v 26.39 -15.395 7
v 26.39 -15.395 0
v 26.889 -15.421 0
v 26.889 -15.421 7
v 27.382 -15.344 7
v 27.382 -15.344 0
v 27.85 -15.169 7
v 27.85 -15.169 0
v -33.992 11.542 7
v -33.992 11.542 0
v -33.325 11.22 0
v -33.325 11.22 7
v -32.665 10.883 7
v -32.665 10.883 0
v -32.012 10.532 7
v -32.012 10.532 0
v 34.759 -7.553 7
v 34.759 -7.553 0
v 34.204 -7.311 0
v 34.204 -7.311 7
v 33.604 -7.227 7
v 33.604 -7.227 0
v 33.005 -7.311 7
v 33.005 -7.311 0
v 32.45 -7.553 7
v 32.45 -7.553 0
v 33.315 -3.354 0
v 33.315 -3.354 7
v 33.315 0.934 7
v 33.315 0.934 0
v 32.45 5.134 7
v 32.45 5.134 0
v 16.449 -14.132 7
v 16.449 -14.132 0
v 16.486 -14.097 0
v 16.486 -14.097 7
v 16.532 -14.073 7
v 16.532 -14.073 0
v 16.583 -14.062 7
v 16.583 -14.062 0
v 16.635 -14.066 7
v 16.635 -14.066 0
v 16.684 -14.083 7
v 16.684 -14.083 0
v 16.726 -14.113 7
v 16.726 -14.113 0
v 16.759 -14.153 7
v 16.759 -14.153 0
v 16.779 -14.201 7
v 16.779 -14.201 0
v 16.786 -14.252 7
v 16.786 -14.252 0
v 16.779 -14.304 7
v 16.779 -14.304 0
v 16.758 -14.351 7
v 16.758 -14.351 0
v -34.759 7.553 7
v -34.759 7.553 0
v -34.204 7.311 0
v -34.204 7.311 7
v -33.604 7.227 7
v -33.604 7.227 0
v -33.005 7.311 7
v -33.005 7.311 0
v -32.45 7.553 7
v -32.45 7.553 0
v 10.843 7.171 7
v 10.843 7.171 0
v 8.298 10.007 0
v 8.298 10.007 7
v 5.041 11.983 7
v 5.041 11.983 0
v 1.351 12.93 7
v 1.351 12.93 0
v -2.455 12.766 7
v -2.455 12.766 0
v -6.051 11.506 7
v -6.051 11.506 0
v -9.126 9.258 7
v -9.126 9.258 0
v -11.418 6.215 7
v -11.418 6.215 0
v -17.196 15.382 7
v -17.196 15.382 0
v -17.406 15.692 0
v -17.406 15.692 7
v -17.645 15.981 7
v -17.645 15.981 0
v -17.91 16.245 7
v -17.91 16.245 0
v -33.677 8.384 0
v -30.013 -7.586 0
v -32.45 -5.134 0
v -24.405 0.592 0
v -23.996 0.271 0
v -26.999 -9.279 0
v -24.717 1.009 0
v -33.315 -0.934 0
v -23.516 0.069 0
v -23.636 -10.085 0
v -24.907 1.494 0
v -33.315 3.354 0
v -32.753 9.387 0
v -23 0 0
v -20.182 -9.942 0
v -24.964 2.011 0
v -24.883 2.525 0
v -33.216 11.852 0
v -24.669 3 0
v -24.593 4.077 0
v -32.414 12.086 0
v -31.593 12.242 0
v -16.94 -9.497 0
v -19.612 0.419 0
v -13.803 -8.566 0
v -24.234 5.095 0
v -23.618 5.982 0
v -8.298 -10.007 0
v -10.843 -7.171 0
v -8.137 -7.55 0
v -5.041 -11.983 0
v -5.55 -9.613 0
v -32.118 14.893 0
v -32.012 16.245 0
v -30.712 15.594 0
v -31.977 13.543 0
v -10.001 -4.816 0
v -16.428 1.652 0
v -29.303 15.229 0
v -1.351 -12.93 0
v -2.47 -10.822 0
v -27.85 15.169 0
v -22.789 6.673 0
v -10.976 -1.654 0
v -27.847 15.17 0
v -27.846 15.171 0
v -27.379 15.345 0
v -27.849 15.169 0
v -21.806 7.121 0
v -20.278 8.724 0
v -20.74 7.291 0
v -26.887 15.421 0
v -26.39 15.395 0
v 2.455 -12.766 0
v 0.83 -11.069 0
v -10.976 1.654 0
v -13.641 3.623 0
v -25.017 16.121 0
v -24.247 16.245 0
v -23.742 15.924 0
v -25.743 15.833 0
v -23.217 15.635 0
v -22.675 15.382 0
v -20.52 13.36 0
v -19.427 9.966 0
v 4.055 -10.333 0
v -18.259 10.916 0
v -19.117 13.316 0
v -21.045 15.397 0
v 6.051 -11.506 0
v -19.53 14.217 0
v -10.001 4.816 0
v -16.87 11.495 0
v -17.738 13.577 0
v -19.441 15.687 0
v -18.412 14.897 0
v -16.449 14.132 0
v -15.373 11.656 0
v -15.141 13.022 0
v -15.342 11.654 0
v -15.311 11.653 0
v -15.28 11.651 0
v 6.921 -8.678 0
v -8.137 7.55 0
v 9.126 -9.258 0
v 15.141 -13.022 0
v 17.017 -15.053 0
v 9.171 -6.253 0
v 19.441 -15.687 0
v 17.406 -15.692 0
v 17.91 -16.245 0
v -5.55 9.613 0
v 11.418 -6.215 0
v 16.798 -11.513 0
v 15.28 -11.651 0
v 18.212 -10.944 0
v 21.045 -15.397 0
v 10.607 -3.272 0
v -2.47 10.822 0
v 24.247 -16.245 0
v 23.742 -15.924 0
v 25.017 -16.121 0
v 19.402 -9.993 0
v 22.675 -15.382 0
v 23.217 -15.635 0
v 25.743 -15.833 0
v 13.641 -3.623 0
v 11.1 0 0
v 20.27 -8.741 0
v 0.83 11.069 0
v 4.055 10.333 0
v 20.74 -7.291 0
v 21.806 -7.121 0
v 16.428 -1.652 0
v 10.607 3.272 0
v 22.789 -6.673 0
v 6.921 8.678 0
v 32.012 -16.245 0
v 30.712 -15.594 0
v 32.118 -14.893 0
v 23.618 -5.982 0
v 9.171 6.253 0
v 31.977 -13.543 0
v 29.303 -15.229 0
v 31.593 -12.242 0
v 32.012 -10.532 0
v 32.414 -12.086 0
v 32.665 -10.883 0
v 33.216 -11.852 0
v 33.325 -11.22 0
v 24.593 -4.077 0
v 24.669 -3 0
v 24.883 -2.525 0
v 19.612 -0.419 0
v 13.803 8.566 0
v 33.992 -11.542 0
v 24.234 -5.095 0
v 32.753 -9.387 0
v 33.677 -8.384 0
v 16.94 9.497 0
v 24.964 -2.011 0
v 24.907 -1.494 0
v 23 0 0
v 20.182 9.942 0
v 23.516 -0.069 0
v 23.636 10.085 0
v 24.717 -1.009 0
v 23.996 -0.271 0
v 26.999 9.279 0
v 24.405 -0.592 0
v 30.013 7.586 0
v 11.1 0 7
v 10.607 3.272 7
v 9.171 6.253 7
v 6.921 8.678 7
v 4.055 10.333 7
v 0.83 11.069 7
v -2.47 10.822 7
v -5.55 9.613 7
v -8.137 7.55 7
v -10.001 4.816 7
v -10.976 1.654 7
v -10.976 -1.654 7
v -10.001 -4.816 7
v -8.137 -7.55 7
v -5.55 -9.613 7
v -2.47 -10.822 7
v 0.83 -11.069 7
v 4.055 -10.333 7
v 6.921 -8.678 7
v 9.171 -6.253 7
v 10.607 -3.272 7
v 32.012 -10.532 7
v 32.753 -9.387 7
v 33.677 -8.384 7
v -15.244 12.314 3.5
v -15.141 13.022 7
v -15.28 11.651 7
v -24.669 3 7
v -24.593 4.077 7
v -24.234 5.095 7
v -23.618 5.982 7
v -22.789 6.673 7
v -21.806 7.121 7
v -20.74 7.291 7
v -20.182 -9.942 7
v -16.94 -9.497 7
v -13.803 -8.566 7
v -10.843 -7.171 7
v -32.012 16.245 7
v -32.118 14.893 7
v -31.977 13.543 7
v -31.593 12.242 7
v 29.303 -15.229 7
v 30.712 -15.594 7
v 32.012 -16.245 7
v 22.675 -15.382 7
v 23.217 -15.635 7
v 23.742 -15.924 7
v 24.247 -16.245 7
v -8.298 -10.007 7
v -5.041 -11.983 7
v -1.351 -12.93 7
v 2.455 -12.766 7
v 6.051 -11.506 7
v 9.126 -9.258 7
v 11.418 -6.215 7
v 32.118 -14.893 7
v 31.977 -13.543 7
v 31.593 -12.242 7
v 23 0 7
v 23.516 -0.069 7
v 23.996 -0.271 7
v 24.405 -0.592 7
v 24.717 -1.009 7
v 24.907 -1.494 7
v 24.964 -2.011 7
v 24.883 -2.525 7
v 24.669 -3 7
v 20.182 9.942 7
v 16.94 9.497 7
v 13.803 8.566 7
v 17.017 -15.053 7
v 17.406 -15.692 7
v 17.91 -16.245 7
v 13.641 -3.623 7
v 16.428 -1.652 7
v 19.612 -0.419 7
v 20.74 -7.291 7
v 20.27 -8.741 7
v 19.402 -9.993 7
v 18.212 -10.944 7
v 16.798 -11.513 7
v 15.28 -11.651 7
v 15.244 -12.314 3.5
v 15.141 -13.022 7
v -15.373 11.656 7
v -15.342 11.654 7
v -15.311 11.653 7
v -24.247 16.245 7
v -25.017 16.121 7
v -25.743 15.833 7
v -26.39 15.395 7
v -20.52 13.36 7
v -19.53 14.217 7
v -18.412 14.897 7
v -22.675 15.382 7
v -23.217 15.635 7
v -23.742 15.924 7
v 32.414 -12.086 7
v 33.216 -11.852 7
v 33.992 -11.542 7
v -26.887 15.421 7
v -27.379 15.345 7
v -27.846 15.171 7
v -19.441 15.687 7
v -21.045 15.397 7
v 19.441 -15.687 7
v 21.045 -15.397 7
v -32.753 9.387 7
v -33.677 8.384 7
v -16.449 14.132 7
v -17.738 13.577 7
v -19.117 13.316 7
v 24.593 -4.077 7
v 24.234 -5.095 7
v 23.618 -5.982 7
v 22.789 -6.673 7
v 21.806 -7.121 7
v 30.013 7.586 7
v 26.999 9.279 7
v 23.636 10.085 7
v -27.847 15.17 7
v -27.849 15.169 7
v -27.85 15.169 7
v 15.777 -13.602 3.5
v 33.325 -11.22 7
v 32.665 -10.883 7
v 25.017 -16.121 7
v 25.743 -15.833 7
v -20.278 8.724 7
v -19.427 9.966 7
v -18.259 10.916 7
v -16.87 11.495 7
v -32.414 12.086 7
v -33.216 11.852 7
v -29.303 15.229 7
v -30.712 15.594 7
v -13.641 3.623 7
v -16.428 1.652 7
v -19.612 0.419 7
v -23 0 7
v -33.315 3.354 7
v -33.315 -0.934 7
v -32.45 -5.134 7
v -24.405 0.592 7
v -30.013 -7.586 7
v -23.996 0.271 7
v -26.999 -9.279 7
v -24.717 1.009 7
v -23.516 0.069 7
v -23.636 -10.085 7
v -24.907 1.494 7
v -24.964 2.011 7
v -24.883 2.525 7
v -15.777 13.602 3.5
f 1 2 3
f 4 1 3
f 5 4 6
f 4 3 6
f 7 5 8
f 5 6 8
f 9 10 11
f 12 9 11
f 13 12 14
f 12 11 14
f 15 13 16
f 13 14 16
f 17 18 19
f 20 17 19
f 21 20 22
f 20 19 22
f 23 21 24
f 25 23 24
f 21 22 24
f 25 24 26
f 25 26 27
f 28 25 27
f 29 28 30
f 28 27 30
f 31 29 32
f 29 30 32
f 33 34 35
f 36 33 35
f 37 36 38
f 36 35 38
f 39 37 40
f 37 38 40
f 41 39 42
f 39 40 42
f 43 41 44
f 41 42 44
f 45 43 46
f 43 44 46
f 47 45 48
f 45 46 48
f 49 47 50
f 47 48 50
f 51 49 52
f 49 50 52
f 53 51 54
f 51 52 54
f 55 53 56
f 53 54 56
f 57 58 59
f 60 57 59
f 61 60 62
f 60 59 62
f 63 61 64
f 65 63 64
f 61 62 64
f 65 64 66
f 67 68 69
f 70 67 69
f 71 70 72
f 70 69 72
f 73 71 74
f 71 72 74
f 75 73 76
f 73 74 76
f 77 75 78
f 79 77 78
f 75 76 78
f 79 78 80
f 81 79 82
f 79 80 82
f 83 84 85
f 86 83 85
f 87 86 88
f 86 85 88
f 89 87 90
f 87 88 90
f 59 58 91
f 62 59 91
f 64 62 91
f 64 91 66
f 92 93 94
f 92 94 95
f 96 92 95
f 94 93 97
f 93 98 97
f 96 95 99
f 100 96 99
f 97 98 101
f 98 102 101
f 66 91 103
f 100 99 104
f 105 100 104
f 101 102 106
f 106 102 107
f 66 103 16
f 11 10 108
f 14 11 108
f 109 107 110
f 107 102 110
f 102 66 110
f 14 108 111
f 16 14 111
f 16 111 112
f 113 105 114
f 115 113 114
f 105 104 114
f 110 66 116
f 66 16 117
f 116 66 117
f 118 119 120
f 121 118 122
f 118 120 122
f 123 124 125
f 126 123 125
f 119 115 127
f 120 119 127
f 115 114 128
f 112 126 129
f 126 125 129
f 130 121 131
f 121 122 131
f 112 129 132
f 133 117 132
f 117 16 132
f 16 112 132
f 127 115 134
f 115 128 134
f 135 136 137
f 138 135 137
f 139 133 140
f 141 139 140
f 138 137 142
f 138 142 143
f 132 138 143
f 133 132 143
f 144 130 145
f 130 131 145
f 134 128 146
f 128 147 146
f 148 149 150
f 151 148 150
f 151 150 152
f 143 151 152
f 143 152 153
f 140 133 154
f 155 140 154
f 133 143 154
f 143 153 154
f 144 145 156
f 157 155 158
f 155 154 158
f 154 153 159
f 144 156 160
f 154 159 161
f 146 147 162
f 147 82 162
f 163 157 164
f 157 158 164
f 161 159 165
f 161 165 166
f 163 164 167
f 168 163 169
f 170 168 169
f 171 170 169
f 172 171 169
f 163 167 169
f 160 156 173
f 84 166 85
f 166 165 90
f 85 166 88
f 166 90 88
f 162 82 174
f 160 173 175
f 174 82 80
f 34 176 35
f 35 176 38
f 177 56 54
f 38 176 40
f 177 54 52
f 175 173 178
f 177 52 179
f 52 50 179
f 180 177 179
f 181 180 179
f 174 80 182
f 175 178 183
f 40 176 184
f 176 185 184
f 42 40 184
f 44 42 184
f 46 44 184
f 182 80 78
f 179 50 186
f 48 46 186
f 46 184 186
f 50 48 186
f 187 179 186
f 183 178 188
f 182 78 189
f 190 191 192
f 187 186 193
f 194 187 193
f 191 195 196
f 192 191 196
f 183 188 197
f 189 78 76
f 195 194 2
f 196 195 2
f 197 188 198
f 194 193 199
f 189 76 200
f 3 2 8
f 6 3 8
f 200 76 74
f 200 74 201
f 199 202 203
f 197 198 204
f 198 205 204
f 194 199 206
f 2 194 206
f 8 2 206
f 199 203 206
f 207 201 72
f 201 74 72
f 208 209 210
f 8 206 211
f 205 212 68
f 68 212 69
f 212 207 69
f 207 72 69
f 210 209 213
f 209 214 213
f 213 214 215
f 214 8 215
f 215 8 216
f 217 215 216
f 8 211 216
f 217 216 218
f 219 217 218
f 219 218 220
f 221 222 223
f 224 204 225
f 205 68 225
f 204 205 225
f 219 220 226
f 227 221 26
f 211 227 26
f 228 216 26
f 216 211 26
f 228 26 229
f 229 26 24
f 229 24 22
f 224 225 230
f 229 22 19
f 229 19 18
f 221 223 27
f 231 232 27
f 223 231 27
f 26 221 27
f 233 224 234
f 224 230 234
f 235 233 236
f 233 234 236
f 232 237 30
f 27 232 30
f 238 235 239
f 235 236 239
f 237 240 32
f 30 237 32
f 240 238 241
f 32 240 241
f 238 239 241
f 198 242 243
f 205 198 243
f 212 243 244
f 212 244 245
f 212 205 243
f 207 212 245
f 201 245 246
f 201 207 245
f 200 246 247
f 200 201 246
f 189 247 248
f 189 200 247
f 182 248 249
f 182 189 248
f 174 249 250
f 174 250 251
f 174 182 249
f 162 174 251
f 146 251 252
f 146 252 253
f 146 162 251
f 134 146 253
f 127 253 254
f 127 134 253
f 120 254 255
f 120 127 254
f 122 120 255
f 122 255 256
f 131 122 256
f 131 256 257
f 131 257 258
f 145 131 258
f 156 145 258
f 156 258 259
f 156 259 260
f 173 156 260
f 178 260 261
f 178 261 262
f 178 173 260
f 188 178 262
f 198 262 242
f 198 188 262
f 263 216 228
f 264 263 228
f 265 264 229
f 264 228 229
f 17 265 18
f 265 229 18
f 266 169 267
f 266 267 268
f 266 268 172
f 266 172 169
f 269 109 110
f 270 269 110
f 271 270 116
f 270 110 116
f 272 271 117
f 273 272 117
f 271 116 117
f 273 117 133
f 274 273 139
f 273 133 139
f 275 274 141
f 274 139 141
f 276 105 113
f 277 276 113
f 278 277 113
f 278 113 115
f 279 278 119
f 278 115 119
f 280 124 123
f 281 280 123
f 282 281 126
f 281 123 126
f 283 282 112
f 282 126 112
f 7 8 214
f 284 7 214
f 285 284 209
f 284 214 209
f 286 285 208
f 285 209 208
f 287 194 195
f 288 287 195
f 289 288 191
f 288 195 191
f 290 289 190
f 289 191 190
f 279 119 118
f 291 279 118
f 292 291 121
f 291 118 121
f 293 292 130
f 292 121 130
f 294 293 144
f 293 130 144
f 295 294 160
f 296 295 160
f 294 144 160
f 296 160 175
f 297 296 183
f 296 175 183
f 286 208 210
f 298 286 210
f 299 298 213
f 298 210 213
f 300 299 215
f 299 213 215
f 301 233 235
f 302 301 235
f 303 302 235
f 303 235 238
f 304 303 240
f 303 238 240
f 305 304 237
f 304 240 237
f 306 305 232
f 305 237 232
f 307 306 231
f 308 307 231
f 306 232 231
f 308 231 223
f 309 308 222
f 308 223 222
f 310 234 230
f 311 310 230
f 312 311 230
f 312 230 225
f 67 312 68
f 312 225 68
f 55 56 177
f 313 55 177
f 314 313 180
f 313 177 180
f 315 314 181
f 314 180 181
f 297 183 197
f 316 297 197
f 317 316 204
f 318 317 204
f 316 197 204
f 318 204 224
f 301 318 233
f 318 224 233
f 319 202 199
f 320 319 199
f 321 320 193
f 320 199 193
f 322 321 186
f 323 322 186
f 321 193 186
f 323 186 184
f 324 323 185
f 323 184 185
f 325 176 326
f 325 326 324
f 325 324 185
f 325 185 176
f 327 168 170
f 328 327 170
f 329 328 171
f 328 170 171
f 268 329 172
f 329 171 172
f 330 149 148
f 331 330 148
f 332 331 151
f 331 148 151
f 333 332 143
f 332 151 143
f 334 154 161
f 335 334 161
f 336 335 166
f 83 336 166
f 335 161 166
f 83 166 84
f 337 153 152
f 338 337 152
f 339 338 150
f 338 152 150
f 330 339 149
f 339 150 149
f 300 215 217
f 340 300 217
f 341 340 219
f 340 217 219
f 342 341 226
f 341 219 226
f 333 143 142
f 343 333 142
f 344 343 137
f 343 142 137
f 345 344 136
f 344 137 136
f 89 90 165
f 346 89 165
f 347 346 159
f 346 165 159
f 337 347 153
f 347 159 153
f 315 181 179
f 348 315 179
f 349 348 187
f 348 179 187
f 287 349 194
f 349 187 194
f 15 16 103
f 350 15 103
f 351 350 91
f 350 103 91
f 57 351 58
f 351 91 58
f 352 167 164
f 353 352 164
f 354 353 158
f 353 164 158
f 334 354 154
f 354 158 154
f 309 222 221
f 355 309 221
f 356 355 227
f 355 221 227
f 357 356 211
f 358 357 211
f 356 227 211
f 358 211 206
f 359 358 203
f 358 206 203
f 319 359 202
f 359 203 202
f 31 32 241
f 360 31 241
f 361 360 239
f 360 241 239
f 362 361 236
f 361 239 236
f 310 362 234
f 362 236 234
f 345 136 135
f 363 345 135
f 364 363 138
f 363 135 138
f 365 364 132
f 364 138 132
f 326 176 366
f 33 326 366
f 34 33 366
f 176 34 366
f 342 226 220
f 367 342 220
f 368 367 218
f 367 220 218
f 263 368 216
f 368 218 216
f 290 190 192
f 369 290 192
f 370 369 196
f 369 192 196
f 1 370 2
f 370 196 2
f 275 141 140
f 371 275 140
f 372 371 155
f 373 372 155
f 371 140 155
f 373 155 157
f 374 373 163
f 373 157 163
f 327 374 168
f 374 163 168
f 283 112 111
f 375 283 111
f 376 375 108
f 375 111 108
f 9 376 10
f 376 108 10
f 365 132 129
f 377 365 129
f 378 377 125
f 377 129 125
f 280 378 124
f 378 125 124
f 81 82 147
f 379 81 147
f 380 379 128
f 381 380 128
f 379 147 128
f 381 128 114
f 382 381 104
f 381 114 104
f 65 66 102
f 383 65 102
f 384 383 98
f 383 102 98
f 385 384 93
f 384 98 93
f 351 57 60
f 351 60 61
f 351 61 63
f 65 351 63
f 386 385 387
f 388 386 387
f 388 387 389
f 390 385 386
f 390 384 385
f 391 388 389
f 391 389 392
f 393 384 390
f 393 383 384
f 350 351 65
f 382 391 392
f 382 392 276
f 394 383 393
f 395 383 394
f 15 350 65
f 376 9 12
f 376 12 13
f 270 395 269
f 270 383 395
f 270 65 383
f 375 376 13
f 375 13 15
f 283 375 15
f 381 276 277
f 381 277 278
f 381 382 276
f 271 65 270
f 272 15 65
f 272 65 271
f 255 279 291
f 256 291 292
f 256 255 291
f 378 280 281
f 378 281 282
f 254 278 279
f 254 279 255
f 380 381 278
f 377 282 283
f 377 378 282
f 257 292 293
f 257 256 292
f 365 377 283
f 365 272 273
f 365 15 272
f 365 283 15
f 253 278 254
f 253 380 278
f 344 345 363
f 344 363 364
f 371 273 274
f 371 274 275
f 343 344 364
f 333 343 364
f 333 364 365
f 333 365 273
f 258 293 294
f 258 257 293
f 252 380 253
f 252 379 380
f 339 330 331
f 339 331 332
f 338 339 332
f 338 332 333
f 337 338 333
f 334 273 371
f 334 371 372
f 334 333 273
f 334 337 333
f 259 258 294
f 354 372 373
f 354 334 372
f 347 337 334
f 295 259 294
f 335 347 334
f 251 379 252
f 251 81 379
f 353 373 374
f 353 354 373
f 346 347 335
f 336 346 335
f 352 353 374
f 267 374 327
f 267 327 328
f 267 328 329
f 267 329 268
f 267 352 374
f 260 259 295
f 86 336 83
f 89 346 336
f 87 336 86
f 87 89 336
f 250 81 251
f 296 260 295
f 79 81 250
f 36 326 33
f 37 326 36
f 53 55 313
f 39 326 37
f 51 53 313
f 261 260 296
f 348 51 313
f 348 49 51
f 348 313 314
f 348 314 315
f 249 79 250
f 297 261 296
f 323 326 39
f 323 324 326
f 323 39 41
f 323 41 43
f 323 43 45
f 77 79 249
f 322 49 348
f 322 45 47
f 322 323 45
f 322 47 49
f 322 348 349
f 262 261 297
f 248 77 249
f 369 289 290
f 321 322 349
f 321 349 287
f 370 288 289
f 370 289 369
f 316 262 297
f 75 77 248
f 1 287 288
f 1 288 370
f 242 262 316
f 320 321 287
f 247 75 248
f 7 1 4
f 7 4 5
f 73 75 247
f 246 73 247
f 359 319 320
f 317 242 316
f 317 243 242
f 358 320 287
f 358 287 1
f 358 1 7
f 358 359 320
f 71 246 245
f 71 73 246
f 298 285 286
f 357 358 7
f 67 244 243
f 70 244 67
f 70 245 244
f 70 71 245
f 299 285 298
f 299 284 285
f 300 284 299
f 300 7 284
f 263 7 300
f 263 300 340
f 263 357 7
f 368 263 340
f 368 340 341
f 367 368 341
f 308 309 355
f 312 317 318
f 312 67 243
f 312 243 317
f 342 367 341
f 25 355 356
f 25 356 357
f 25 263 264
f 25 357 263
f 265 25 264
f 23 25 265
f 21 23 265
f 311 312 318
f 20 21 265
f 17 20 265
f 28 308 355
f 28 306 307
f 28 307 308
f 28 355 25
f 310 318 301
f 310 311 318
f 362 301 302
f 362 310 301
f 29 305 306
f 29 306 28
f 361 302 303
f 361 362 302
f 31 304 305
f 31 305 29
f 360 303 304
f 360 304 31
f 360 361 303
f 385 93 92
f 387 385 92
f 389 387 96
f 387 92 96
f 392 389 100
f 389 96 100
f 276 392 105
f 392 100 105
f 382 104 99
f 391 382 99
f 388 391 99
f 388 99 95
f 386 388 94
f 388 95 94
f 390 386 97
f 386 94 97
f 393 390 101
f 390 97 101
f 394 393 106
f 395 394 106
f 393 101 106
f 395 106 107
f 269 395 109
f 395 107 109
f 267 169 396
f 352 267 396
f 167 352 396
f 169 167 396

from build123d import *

# Parameters (mm, degrees)
F0_R     = 11.1
F1_DEPTH = 7


with BuildPart() as f1:
    # F0 (on Top) → F1 (new body)
    with BuildSketch(Plane.XY):
        with BuildLine():
            ThreePointArc((-20.1820022707, -9.9415058496), (-15.3539348415, -9.091091221), (-10.8430645172, -7.1713284596))
            ThreePointArc((-10.8430645172, -7.1713284596), (0.5582056386, -12.9880101041), (11.4183705824, -6.2145646061))
            ThreePointArc((11.4183705824, -6.2145646061), (16.4281860721, -1.651791194), (23, 0))
            ThreePointArc((23, 0), (24.7165507362, -1.0092828133), (24.6691871434, -3))
            ThreePointArc((24.6691871434, -3), (23.6178456633, -5.9816728989), (20.7402704139, -7.2913495265))
            ThreePointArc((20.7402704139, -7.2913495265), (18.8416140451, -10.5123262229), (15.2804029597, -11.6513444364))
            add(Edge.make_bspline(
                [(15.1405816519, -13.0223987218), (15.2788713972, -12.2898082007), (15.2804029597, -11.6513444364)],
                knots=[5.0540557872, 5.0540557872, 5.0540557872, 5.4022551178, 5.4022551178, 5.4022551178], degree=2, weights=[1, 0.9848828954, 1]))
            add(Edge.make_bspline(
                [(15.1405816519, -13.0223987218), (15.7602589992, -13.627545907), (16.4485412205, -14.1319848698)],
                knots=[2.4227067274, 2.4227067274, 2.4227067274, 2.5604830279, 2.5604830279, 2.5604830279], degree=2, weights=[1, 0.9976281496, 1]))
            ThreePointArc((16.4485412205, -14.1319848698), (16.7059454387, -14.0965620619), (16.7578368283, -14.3511578014))
            ThreePointArc((16.7578368283, -14.3511578014), (17.1960707743, -15.3819952285), (17.9098490626, -16.2452422082))
            ThreePointArc((17.9098490626, -16.2452422082), (20.2370224114, -15.5077337484), (22.6750224829, -15.3819952285))
            ThreePointArc((22.6750224829, -15.3819952285), (23.4818826617, -15.7752677938), (24.2466118351, -16.2452422082))
            ThreePointArc((24.2466118351, -16.2452422082), (25.3881728474, -15.9967588485), (26.3896299553, -15.3951034771))
            ThreePointArc((26.3896299553, -15.3951034771), (27.1373975838, -15.3951361034), (27.8500681048, -15.1687356707))
            ThreePointArc((27.8500681048, -15.1687356707), (30.0171813338, -15.3741600066), (32.0121236145, -16.2452422082))
            ThreePointArc((32.0121236145, -16.2452422082), (32.0780721748, -14.2146599803), (31.5934991398, -12.2416413867))
            ThreePointArc((31.5934991398, -12.2416413867), (32.8180555594, -11.9786425212), (33.9920036495, -11.5421190858))
            ThreePointArc((33.9920036495, -11.5421190858), (32.9938729979, -11.0530795037), (32.0121236145, -10.5319339782))
            ThreePointArc((32.0121236145, -10.5319339782), (33.1937729386, -8.8658671292), (34.7588080404, -7.5533356057))
            ThreePointArc((34.7588080404, -7.5533356057), (33.6044737815, -7.2274734783), (32.4501395226, -7.5533356057))
            ThreePointArc((32.4501395226, -7.5533356057), (33.4243691341, -1.2097485956), (32.4501395226, 5.1338384145))
            ThreePointArc((32.4501395226, 5.1338384145), (26.9985929856, 9.2793222728), (20.1820022707, 9.9415058496))
            ThreePointArc((20.1820022707, 9.9415058496), (15.3539348415, 9.091091221), (10.8430645172, 7.1713284596))
            ThreePointArc((10.8430645172, 7.1713284596), (-0.5582056386, 12.9880101041), (-11.4183705824, 6.2145646061))
            ThreePointArc((-11.4183705824, 6.2145646061), (-16.4281860721, 1.651791194), (-23, 0))
            ThreePointArc((-23, 0), (-24.7165507362, 1.0092828133), (-24.6691871434, 3))
            ThreePointArc((-24.6691871434, 3), (-23.6178456633, 5.9816728989), (-20.7402704139, 7.2913495265))
            ThreePointArc((-20.7402704139, 7.2913495265), (-18.8775642358, 10.4833581386), (-15.3726424061, 11.6555851871))
            add(Edge.make_bspline(
                [(-15.2804029597, 11.6513444364), (-15.325524504, 11.6549876637), (-15.3726424061, 11.6555851871)],
                knots=[0.2580425601, 0.2580425601, 0.2580425601, 0.2952358655, 0.2952358655, 0.2952358655], degree=2, weights=[1, 0.9998270872, 1]))
            add(Edge.make_bspline(
                [(-15.1405816519, 13.0223987218), (-15.2788713972, 12.2898082007), (-15.2804029597, 11.6513444364)],
                knots=[5.0540557872, 5.0540557872, 5.0540557872, 5.4022551178, 5.4022551178, 5.4022551178], degree=2, weights=[1, 0.9848828954, 1]))
            add(Edge.make_bspline(
                [(-15.1405816519, 13.0223987218), (-15.7602589992, 13.627545907), (-16.4485412205, 14.1319848698)],
                knots=[2.4227067274, 2.4227067274, 2.4227067274, 2.5604830279, 2.5604830279, 2.5604830279], degree=2, weights=[1, 0.9976281496, 1]))
            ThreePointArc((-16.4485412205, 14.1319848698), (-18.4202217975, 13.4084166875), (-20.5199281941, 13.3603723279))
            ThreePointArc((-20.5199281941, 13.3603723279), (-18.985312905, 14.5805065249), (-17.1960707743, 15.3819952285))
            ThreePointArc((-17.1960707743, 15.3819952285), (-17.5217288035, 15.8394422571), (-17.9098490626, 16.2452422082))
            ThreePointArc((-17.9098490626, 16.2452422082), (-20.2370224114, 15.5077337484), (-22.6750224829, 15.3819952285))
            ThreePointArc((-22.6750224829, 15.3819952285), (-23.4818826617, 15.7752677938), (-24.2466118351, 16.2452422082))
            ThreePointArc((-24.2466118351, 16.2452422082), (-25.3881728474, 15.9967588485), (-26.3896299553, 15.3951034771))
            ThreePointArc((-26.3896299553, 15.3951034771), (-27.1352445397, 15.395468841), (-27.8461648315, 15.1706720867))
            ThreePointArc((-27.8461648315, 15.1706720867), (-27.8481169003, 15.1697047499), (-27.8500681048, 15.1687356707))
            ThreePointArc((-27.8500681048, 15.1687356707), (-30.0171813338, 15.3741600066), (-32.0121236145, 16.2452422082))
            ThreePointArc((-32.0121236145, 16.2452422082), (-32.0780721748, 14.2146599803), (-31.5934991398, 12.2416413867))
            ThreePointArc((-31.5934991398, 12.2416413867), (-32.8180555594, 11.9786425212), (-33.9920036495, 11.5421190858))
            ThreePointArc((-33.9920036495, 11.5421190858), (-32.9938729979, 11.0530795037), (-32.0121236145, 10.5319339782))
            ThreePointArc((-32.0121236145, 10.5319339782), (-33.1937729386, 8.8658671292), (-34.7588080404, 7.5533356057))
            ThreePointArc((-34.7588080404, 7.5533356057), (-33.6044737815, 7.2274734783), (-32.4501395226, 7.5533356057))
            ThreePointArc((-32.4501395226, 7.5533356057), (-33.4243691341, 1.2097485956), (-32.4501395226, -5.1338384145))
            ThreePointArc((-32.4501395226, -5.1338384145), (-26.9985929856, -9.2793222728), (-20.1820022707, -9.9415058496))
        make_face()
        Circle(F0_R, mode=Mode.SUBTRACT)
        with BuildLine():
            ThreePointArc((-15.3726424061, 11.6555851871), (-15.326513354, 11.6536677218), (-15.2804029597, 11.6513444364))
            add(Edge.make_bspline(
                [(-15.2804029597, 11.6513444364), (-15.325524504, 11.6549876637), (-15.3726424061, 11.6555851871)],
                knots=[0.2580425601, 0.2580425601, 0.2580425601, 0.2952358655, 0.2952358655, 0.2952358655], degree=2, weights=[1, 0.9998270872, 1]))
        make_face()
    extrude(amount=F1_DEPTH)


solid = f1.part
